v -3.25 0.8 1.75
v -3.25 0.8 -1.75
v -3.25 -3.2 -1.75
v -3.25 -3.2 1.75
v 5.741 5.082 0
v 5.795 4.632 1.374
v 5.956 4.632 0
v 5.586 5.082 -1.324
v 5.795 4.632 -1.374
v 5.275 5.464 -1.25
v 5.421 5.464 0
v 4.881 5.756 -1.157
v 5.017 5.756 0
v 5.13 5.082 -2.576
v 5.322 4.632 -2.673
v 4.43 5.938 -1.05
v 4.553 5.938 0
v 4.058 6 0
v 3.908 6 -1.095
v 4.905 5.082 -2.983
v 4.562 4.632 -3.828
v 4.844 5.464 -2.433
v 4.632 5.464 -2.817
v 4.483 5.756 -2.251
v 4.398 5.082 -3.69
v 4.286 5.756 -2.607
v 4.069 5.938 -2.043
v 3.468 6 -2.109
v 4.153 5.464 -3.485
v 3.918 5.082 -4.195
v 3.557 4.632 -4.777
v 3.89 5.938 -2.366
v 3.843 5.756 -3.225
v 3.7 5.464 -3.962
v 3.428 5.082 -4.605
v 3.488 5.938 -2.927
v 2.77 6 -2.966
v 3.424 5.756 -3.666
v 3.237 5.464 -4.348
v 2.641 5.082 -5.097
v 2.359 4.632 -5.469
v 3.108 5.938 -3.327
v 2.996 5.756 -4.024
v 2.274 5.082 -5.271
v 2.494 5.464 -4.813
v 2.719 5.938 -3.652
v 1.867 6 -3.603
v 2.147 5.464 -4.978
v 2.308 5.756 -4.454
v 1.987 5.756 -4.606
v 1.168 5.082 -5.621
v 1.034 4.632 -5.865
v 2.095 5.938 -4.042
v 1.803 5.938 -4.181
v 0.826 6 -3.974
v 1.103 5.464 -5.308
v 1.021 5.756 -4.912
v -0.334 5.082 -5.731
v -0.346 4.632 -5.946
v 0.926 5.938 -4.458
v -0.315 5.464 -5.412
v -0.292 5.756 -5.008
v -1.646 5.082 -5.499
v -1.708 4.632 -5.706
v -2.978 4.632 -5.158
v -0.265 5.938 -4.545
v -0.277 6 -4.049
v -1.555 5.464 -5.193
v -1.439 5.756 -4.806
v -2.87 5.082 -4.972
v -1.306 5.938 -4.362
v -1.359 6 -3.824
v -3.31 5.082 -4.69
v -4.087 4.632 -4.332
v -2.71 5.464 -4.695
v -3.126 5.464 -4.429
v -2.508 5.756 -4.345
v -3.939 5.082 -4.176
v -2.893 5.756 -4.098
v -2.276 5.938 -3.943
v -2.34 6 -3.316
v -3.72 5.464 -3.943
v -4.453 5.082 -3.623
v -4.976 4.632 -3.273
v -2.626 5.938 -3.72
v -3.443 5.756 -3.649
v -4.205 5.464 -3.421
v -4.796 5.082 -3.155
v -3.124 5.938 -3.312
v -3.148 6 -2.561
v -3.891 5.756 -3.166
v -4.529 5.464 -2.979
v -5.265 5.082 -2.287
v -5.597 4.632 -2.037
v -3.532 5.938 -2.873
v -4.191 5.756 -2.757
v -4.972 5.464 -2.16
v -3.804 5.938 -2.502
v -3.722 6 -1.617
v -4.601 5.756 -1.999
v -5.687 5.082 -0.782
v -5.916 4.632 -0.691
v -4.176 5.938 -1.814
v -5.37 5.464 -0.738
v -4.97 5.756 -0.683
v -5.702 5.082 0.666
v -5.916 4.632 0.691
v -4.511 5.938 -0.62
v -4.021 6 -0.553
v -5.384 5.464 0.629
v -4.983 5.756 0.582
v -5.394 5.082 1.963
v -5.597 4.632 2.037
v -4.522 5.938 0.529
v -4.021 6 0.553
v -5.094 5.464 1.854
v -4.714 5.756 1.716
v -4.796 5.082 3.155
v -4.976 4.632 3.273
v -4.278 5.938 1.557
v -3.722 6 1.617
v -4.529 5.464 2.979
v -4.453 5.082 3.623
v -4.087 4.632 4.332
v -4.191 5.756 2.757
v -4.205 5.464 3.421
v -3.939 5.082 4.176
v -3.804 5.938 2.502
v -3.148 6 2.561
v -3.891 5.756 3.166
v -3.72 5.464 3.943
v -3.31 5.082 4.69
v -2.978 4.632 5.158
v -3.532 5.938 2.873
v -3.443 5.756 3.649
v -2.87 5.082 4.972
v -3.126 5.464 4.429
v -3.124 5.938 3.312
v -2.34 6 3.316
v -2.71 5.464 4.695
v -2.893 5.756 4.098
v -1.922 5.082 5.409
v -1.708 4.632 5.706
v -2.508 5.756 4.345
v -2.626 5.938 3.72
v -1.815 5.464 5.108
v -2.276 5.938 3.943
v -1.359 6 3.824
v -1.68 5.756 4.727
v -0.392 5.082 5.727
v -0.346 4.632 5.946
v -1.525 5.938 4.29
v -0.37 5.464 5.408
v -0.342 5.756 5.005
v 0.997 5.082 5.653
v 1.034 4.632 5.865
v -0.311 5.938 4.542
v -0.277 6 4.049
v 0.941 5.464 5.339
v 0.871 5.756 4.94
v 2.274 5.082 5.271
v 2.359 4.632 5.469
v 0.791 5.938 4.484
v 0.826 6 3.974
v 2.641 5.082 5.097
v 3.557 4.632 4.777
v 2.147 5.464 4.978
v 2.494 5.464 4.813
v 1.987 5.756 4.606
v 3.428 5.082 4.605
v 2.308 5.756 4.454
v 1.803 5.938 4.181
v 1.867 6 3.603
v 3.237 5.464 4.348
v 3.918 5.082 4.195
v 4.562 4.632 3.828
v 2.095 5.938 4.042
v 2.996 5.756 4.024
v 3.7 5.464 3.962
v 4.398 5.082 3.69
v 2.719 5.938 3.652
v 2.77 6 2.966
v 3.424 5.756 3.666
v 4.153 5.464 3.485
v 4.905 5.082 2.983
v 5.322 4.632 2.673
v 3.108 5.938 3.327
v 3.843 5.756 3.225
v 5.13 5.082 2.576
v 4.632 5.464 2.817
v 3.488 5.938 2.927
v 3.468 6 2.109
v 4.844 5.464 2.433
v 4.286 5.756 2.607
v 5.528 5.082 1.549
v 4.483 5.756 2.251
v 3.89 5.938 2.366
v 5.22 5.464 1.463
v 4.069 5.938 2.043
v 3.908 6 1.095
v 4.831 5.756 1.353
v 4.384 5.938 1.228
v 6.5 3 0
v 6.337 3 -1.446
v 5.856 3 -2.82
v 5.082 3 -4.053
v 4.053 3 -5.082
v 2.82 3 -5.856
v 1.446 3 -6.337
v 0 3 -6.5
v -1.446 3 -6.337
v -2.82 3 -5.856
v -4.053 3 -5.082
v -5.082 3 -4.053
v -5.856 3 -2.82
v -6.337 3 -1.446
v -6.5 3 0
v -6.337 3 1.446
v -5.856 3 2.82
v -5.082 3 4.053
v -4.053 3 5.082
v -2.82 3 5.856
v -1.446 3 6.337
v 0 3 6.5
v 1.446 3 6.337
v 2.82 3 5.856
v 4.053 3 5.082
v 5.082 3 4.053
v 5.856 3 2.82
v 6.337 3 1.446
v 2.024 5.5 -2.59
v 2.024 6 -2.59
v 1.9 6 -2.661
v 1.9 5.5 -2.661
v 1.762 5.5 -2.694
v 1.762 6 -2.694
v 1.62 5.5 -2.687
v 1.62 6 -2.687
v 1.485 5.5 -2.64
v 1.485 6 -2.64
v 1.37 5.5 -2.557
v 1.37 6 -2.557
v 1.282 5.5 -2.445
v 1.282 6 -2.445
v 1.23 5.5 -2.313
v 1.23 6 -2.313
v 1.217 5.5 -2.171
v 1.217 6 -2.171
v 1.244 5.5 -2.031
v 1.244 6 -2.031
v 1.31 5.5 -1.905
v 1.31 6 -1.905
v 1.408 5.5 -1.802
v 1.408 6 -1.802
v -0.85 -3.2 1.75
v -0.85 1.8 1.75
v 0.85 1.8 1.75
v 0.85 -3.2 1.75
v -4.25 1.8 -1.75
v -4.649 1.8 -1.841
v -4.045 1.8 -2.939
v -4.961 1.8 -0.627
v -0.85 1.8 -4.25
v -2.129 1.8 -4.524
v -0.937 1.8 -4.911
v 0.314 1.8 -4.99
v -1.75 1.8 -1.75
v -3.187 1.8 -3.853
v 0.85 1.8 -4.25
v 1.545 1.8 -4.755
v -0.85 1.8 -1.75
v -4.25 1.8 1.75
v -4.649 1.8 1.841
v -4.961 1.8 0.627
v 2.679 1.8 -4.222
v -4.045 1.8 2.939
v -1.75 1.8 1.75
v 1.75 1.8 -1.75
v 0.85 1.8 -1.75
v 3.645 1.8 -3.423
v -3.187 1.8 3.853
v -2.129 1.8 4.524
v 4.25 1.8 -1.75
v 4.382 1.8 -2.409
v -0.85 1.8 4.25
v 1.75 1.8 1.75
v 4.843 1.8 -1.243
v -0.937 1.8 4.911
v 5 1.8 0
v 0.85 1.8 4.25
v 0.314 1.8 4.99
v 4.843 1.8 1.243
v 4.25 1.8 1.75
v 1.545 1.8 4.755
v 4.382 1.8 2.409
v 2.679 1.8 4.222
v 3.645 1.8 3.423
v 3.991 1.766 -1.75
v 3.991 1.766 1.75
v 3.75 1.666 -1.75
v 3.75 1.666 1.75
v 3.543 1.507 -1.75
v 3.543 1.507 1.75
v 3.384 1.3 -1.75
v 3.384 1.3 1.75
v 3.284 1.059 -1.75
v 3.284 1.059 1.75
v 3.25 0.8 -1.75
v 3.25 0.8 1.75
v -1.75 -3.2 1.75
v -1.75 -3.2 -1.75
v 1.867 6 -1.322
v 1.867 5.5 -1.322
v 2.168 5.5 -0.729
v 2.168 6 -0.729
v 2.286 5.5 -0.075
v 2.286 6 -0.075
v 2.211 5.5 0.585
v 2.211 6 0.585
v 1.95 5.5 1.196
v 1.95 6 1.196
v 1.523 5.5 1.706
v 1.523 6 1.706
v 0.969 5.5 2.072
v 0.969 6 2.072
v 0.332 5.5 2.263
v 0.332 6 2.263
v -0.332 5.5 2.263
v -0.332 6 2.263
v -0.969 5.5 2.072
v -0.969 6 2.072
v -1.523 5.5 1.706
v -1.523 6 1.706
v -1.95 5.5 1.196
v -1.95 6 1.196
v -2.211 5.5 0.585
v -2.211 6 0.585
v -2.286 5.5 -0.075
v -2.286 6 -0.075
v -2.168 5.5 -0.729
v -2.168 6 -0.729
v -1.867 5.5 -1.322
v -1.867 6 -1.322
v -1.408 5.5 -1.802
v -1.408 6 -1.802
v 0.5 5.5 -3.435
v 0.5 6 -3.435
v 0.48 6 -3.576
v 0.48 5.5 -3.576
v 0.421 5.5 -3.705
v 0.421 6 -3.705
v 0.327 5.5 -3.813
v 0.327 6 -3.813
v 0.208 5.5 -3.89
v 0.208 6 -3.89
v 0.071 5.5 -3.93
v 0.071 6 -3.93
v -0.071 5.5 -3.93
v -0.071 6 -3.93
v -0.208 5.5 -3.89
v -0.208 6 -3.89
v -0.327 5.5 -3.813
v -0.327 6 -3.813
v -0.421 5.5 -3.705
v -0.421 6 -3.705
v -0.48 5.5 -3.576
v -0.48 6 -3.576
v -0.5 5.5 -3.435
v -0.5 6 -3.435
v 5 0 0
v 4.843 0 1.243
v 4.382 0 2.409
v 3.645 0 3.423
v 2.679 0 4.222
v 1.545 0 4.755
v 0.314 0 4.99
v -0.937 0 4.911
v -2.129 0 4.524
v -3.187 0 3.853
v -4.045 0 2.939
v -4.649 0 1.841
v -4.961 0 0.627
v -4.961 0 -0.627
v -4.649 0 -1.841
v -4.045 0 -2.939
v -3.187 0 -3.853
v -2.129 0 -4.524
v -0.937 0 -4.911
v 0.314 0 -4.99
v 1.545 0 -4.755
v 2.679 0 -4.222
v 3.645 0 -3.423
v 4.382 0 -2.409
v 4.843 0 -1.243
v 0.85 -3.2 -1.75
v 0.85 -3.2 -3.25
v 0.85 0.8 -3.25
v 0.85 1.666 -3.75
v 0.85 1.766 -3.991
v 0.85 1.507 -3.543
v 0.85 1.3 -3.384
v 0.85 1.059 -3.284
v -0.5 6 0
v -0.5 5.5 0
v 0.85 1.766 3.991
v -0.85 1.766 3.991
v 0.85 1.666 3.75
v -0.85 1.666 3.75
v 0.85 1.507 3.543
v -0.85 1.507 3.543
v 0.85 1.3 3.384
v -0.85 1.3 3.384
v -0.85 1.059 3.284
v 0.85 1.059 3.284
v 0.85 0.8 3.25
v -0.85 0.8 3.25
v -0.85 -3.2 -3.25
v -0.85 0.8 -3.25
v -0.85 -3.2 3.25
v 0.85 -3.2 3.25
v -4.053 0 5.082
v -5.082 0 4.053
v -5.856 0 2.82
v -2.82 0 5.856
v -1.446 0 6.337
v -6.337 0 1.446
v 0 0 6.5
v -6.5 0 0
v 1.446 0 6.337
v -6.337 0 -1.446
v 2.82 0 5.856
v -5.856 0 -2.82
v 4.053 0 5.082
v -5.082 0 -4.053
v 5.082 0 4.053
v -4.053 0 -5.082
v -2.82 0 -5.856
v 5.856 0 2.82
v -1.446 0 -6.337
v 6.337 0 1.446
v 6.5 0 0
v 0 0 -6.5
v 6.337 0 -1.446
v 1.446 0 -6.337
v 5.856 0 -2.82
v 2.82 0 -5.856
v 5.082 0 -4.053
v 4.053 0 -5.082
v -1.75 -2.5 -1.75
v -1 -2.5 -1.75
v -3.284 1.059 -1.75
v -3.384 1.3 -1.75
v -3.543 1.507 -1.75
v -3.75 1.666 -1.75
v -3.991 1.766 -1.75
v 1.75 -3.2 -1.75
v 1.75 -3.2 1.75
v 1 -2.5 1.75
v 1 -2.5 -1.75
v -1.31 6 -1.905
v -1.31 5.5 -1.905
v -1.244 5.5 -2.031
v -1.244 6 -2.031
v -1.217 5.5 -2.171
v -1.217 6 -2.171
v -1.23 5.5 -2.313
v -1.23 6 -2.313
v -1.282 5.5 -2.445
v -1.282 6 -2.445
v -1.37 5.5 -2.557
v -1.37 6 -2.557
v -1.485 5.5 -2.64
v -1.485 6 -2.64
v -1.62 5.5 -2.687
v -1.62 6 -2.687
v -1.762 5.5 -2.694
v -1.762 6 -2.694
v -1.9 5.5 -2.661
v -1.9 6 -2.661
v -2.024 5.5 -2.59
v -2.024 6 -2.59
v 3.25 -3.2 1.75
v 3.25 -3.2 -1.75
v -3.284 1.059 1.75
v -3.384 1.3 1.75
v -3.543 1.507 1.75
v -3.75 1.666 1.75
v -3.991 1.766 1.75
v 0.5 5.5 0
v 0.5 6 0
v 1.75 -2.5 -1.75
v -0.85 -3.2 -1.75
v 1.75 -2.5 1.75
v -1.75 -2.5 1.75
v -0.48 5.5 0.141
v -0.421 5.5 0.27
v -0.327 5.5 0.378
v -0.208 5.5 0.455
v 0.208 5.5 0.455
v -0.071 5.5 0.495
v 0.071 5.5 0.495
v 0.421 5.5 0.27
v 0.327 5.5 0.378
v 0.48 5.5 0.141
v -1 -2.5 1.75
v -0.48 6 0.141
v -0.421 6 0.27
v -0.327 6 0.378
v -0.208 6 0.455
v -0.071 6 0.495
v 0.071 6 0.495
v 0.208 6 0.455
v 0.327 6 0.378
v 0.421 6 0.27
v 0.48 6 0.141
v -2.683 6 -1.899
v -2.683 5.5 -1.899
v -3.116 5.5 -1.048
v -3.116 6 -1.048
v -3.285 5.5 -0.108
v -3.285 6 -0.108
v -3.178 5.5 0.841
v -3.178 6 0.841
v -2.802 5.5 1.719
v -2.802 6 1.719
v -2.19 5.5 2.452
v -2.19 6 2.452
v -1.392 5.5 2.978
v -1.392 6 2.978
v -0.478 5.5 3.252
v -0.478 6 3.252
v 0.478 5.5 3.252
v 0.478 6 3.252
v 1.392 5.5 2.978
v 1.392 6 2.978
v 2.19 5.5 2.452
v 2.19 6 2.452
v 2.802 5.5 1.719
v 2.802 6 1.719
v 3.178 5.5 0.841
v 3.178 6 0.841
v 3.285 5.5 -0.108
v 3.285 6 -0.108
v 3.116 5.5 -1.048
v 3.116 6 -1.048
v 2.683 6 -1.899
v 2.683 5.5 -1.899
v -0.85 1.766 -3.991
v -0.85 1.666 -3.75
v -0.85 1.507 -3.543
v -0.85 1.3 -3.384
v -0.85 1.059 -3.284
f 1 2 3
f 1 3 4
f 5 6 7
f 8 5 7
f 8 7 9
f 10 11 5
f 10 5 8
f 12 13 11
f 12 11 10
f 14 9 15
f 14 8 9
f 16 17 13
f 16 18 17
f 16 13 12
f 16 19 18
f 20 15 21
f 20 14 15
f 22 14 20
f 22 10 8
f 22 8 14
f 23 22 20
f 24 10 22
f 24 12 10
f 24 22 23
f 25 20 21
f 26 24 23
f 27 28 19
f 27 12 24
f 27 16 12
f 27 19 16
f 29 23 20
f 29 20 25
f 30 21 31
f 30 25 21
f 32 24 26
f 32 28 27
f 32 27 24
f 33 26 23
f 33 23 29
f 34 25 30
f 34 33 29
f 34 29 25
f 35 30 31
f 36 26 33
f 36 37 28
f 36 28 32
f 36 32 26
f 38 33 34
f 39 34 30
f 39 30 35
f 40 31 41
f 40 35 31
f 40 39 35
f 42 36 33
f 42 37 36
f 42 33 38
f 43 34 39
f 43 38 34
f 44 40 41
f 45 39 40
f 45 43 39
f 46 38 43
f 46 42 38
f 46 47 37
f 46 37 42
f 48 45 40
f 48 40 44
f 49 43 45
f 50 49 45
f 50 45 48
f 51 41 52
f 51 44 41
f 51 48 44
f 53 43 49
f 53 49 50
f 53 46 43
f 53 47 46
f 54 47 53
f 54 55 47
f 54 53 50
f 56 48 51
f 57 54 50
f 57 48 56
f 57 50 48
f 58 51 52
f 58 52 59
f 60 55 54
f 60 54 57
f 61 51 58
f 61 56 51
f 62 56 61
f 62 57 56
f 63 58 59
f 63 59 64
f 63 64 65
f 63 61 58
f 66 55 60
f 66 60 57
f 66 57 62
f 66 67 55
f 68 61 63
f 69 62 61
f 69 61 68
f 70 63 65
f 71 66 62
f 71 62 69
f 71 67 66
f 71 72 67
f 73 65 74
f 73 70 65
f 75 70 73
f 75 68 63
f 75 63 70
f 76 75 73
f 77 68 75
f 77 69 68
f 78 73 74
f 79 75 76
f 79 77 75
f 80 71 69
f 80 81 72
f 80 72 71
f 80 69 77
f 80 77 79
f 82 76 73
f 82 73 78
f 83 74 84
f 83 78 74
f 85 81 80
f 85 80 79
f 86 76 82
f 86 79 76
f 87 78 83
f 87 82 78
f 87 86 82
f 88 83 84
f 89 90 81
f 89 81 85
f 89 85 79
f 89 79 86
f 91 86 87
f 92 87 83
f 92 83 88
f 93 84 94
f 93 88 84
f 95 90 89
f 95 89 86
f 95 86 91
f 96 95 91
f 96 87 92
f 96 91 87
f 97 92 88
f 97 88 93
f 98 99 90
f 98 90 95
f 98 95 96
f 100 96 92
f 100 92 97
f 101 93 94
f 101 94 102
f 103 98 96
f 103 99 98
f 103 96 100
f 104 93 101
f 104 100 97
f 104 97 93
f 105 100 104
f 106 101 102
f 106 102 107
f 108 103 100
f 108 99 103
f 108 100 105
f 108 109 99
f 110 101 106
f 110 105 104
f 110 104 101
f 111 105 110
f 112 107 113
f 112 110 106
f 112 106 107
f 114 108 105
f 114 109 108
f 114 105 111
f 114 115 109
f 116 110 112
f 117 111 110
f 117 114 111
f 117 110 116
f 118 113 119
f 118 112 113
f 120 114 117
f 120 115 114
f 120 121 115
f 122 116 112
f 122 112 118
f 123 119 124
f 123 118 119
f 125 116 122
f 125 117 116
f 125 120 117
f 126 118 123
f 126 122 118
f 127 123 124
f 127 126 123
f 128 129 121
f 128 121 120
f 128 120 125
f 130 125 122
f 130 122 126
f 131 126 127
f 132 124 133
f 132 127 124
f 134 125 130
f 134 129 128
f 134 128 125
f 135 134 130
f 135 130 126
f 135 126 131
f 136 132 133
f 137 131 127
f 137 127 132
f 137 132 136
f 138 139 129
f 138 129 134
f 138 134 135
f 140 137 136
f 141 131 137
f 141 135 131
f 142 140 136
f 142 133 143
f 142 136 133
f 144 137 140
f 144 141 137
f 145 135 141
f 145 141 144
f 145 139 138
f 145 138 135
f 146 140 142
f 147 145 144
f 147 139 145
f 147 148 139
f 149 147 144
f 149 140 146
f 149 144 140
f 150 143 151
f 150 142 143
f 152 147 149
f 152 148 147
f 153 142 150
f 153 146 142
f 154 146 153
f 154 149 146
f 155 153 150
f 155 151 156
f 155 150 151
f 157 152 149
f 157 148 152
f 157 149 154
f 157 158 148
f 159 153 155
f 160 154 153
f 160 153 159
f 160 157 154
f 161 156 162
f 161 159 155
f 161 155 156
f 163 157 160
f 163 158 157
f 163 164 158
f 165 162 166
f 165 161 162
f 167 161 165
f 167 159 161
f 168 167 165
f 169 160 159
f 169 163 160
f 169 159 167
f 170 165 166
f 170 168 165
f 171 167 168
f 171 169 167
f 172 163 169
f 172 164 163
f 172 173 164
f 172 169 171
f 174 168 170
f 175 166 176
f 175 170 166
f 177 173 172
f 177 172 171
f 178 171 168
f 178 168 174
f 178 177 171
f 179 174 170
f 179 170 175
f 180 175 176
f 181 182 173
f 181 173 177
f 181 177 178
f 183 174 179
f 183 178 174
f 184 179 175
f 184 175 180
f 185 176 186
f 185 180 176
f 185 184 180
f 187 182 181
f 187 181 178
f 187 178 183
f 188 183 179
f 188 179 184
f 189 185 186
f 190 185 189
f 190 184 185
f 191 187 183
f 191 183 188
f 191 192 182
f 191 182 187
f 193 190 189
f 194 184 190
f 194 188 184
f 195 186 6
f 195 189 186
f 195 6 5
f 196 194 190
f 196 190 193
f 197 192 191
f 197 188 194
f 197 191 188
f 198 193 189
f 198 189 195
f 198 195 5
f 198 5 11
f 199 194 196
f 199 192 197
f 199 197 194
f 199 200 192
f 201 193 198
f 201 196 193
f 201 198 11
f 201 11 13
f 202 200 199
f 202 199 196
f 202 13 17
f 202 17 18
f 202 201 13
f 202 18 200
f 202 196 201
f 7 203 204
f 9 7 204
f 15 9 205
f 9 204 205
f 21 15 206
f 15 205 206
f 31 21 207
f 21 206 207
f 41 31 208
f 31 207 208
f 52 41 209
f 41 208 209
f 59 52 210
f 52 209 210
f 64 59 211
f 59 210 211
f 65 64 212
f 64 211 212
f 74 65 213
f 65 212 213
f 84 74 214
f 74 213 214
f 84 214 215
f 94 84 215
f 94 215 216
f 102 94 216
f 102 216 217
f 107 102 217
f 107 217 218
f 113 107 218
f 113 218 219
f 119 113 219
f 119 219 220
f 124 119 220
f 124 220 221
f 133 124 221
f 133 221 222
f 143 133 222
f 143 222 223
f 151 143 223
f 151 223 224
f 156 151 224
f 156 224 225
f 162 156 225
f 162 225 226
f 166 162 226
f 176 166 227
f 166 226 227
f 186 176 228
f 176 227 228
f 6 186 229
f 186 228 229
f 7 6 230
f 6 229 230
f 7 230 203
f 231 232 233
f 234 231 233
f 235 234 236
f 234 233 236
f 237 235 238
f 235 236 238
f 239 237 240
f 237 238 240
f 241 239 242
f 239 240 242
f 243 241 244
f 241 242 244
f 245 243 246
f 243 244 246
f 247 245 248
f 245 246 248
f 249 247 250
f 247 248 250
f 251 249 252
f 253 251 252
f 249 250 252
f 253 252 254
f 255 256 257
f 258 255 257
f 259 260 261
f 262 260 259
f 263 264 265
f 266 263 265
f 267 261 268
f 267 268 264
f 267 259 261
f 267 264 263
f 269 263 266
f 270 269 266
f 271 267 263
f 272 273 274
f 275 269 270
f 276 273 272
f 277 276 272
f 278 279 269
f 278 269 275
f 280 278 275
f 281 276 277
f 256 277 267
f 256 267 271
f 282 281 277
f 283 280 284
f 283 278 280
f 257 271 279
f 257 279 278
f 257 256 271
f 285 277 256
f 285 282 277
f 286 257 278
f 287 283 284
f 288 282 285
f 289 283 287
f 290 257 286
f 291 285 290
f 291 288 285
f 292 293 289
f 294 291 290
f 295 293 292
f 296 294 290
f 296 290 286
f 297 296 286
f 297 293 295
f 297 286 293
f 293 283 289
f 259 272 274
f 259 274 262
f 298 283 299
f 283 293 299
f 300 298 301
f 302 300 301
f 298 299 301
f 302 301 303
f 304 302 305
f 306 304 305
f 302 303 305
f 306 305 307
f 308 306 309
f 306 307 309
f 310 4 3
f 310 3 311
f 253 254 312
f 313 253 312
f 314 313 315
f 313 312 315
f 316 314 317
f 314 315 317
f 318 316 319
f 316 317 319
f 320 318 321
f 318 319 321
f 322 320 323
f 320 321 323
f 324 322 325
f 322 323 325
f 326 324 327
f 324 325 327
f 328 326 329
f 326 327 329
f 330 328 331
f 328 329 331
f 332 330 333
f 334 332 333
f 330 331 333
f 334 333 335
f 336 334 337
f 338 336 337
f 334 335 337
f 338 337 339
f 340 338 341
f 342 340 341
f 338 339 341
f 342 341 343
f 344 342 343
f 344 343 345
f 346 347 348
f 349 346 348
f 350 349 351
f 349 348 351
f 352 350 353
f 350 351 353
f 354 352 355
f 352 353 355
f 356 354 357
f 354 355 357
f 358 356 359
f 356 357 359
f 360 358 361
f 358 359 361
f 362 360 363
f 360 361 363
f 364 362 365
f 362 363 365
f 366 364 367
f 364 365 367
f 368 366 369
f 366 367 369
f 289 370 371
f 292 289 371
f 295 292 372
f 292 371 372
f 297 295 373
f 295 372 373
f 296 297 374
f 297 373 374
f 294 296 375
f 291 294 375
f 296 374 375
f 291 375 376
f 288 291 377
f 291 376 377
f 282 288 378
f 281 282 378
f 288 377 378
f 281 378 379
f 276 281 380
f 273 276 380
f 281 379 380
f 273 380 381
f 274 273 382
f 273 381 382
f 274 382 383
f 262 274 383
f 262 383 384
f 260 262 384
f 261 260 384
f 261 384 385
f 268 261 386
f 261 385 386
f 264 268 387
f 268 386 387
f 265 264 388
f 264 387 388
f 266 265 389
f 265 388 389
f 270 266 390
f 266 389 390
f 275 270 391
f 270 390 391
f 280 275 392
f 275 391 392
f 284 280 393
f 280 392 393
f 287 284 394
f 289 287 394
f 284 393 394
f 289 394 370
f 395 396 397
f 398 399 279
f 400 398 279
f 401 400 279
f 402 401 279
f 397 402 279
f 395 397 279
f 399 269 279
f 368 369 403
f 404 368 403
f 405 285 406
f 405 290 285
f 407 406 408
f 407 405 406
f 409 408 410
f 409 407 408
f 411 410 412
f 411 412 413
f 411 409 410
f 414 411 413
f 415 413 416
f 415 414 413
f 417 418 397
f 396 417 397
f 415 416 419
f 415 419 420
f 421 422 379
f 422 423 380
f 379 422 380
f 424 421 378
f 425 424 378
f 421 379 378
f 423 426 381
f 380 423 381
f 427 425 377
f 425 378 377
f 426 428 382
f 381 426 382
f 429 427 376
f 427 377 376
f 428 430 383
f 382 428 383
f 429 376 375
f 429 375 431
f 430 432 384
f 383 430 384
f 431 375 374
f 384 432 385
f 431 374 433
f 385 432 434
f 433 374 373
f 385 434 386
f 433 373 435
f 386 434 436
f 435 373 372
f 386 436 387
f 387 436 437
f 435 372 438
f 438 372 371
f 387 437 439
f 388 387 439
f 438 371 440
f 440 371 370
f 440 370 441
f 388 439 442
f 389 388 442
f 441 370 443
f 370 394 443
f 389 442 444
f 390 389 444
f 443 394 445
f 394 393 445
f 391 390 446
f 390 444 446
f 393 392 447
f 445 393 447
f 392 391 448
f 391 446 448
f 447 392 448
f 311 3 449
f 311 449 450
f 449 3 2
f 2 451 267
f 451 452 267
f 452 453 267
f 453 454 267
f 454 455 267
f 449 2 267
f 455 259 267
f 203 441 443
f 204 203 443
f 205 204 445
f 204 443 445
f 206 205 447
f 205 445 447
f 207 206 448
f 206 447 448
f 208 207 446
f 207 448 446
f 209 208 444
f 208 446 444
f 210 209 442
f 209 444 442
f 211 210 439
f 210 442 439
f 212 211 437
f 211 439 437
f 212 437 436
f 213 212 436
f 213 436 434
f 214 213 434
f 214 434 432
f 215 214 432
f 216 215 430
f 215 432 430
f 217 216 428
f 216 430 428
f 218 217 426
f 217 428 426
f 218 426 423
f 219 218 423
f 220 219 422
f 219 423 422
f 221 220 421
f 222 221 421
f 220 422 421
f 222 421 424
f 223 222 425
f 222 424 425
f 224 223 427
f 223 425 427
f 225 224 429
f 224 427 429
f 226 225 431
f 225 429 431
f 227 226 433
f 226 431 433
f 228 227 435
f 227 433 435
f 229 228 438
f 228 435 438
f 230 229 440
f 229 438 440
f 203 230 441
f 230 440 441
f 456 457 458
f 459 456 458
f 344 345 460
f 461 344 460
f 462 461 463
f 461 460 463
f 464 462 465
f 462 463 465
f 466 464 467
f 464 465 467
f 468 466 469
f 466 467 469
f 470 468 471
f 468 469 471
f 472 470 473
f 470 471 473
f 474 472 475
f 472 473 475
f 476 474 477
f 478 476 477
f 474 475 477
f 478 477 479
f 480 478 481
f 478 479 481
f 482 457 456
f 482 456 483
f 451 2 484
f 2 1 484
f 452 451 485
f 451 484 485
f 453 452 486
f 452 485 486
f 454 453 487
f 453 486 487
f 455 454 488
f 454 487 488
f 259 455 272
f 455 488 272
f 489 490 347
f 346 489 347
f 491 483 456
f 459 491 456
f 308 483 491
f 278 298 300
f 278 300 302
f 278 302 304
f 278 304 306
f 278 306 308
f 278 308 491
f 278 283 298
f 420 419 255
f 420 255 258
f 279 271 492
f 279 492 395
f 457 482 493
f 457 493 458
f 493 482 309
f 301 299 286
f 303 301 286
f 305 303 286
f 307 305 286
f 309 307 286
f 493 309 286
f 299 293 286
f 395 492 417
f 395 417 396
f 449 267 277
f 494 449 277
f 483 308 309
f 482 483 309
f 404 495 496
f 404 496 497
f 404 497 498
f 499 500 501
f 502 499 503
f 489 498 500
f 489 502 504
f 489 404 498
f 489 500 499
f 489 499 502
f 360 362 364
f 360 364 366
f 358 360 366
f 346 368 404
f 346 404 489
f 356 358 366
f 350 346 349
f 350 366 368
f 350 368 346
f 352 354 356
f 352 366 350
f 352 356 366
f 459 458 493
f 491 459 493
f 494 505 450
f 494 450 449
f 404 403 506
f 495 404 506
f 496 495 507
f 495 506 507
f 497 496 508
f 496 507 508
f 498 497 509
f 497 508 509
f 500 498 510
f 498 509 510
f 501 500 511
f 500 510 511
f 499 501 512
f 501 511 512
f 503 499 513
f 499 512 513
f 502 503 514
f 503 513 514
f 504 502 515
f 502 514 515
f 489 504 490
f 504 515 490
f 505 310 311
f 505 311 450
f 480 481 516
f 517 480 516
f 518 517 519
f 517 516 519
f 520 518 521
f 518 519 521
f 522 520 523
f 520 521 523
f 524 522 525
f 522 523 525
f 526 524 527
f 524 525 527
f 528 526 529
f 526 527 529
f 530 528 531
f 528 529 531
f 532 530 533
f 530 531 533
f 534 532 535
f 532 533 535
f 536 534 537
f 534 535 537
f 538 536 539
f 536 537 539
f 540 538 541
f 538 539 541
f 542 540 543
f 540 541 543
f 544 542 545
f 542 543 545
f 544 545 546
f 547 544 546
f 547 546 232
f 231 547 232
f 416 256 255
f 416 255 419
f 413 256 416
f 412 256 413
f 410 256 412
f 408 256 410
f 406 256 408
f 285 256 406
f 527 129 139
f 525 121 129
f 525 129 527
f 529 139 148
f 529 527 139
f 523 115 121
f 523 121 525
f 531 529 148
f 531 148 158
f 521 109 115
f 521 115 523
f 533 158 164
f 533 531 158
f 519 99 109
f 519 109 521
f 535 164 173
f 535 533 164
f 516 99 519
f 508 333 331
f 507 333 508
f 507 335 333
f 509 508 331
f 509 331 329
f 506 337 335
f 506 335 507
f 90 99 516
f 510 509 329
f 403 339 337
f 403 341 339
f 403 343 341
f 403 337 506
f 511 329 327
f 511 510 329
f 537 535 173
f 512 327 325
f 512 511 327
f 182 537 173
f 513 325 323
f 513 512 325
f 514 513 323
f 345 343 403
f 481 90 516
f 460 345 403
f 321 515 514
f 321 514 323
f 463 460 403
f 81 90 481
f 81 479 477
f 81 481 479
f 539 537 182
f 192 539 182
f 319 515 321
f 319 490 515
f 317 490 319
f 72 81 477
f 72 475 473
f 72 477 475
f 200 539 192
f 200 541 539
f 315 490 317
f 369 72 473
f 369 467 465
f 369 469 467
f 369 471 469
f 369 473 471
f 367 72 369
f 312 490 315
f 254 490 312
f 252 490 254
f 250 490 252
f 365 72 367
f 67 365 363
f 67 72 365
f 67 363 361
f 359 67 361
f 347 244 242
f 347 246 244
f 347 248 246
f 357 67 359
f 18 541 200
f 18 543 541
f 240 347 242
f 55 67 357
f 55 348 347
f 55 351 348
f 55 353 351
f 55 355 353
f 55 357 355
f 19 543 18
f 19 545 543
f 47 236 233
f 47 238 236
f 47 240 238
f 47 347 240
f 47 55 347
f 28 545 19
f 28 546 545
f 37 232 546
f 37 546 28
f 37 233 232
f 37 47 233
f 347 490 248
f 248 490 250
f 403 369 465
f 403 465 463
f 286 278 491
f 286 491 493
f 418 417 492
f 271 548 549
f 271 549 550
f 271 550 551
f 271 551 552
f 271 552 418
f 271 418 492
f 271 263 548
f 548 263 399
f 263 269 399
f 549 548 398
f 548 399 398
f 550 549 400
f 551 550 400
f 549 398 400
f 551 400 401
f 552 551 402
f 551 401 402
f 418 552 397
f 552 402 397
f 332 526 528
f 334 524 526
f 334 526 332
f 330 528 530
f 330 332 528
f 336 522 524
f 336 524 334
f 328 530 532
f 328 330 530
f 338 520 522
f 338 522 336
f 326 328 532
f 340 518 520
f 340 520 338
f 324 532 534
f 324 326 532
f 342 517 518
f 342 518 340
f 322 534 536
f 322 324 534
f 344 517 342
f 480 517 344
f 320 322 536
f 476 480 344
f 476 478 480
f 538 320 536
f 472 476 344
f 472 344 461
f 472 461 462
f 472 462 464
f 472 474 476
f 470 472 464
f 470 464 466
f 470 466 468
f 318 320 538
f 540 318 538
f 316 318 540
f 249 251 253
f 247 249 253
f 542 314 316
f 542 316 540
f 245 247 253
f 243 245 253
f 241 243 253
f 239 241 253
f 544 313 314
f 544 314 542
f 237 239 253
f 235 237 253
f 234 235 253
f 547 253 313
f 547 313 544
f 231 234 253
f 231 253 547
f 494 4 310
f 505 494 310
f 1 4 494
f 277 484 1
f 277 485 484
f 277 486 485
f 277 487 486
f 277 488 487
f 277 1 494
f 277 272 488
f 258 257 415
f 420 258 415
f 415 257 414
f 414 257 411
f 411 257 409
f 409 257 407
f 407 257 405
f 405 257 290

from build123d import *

# Parameters (mm, degrees)
SKETCH1_R           = 6.5
BOSS_EXTRUDE1_DEPTH = 3
SKETCH2_R           = 5.5
FILLET1_R           = 2
SKETCH3_R           = 0.5
CUT_EXTRUDE1_DEPTH  = 0.5
SKETCH4_R           = 5
CUT_EXTRUDE2_DEPTH  = 1.8
SKETCH5_W           = 1.5
SKETCH5_H           = 3.5
SKETCH5_W_2         = 1.7
SKETCH5_H_2         = 1.5
BOSS_EXTRUDE3_DEPTH = 5
BOSS_EXTRUDE4_DEPTH = 3.5
FILLET2_R           = 1


with BuildPart() as part:
    # Sketch1 → Boss-Extrude1 (new body)
    with BuildSketch(Plane(origin=(0, 0, 0), x_dir=(1, 0, 0), z_dir=(0, 1, 0))):
        Circle(SKETCH1_R)
    extrude(amount=BOSS_EXTRUDE1_DEPTH)

    # Sketch2 → section 0 of loft1
    with BuildSketch(Plane(origin=(0, 6, 0), x_dir=(1, 0, 0), z_dir=(0, 1, 0)), mode=Mode.PRIVATE) as loft1_s0:
        Circle(SKETCH2_R)
    # loft up to a face of the part (loft1)
    loft([loft1_s0.sketch, part.faces().sort_by_distance((0, 3, 0))[0]])

    # Fillet1
    fillet1_edges = [part.edges().sort_by_distance(p)[0] for p in [
        (-5.5, 6, 0),
    ]]
    fillet(fillet1_edges, radius=FILLET1_R)

    # Sketch3 → Cut-Extrude1 (cut)
    with BuildSketch(Plane(origin=(0, 6, 0), x_dir=(1, 0, 0), z_dir=(0, 1, 0))):
        with BuildLine():
            Line((0.5, 0), (0.5, 3.435004881))
            ThreePointArc((0.5, 3.435004881), (0, 3.935004881), (-0.5, 3.435004881))
            Line((-0.5, 3.435004881), (-0.5, 0))
            ThreePointArc((-0.5, 0), (0, -0.5), (0.5, 0))
        make_face()
        with BuildLine():
            ThreePointArc((-1.408185783, 1.802395609), (-2.110021897, 1.888570248), (-2.023847258, 2.590406363))
            ThreePointArc((-2.023847258, 2.590406363), (0, -3.287272859), (2.023847258, 2.590406363))
            ThreePointArc((2.023847258, 2.590406363), (2.165413544, 2.415586559), (2.21601652, 2.196400986))
            ThreePointArc((2.21601652, 2.196400986), (1.935202094, 1.747003963), (1.408185783, 1.802395609))
            ThreePointArc((1.408185783, 1.802395609), (0, -2.287272859), (-1.408185783, 1.802395609))
        make_face()
        with Locations((1.71601652, 2.196400986)):
            Circle(SKETCH3_R)
        with Locations((-1.71601652, 2.196400986)):
            Circle(SKETCH3_R)
    extrude(amount=-CUT_EXTRUDE1_DEPTH, mode=Mode.SUBTRACT)

    # Sketch4 → Cut-Extrude2 (cut)
    with BuildSketch(Plane.XZ):
        Circle(SKETCH4_R)
    extrude(amount=-CUT_EXTRUDE2_DEPTH, mode=Mode.SUBTRACT)

    # Sketch5 → Boss-Extrude3 (add)
    with BuildSketch(Plane.XZ.offset(-1.8)):
        with Locations((2.5, 0)):
            Rectangle(SKETCH5_W, SKETCH5_H)
        with Locations((0, -2.5)):
            Rectangle(SKETCH5_W_2, SKETCH5_H_2)
        with Locations((-2.5, 0)):
            Rectangle(SKETCH5_W, SKETCH5_H)
        with Locations((0, 2.5)):
            Rectangle(SKETCH5_W_2, SKETCH5_H_2)
    extrude(amount=BOSS_EXTRUDE3_DEPTH)

    # Sketch6 → Boss-Extrude4 (add)
    with BuildSketch(Plane.XY.offset(1.75)):
        Polygon((1.75, -3.2), (1, -2.5), (1.75, -2.5), align=None)
    boss_extrude4 = extrude(amount=-BOSS_EXTRUDE4_DEPTH)

    # Mirror1: Boss-Extrude4 across plane
    add(boss_extrude4.mirror(Plane(origin=(0, 0, 0), x_dir=(0, 0, 1), z_dir=(1, 0, 0))))

    # Fillet2
    fillet2_edges = [part.edges().sort_by_distance(p)[0] for p in [
        (3.25, 1.8, 0),
        (0, 1.8, -3.25),
        (-3.25, 1.8, 0),
        (0, 1.8, 3.25),
    ]]
    fillet(fillet2_edges, radius=FILLET2_R)


solid = part.part
